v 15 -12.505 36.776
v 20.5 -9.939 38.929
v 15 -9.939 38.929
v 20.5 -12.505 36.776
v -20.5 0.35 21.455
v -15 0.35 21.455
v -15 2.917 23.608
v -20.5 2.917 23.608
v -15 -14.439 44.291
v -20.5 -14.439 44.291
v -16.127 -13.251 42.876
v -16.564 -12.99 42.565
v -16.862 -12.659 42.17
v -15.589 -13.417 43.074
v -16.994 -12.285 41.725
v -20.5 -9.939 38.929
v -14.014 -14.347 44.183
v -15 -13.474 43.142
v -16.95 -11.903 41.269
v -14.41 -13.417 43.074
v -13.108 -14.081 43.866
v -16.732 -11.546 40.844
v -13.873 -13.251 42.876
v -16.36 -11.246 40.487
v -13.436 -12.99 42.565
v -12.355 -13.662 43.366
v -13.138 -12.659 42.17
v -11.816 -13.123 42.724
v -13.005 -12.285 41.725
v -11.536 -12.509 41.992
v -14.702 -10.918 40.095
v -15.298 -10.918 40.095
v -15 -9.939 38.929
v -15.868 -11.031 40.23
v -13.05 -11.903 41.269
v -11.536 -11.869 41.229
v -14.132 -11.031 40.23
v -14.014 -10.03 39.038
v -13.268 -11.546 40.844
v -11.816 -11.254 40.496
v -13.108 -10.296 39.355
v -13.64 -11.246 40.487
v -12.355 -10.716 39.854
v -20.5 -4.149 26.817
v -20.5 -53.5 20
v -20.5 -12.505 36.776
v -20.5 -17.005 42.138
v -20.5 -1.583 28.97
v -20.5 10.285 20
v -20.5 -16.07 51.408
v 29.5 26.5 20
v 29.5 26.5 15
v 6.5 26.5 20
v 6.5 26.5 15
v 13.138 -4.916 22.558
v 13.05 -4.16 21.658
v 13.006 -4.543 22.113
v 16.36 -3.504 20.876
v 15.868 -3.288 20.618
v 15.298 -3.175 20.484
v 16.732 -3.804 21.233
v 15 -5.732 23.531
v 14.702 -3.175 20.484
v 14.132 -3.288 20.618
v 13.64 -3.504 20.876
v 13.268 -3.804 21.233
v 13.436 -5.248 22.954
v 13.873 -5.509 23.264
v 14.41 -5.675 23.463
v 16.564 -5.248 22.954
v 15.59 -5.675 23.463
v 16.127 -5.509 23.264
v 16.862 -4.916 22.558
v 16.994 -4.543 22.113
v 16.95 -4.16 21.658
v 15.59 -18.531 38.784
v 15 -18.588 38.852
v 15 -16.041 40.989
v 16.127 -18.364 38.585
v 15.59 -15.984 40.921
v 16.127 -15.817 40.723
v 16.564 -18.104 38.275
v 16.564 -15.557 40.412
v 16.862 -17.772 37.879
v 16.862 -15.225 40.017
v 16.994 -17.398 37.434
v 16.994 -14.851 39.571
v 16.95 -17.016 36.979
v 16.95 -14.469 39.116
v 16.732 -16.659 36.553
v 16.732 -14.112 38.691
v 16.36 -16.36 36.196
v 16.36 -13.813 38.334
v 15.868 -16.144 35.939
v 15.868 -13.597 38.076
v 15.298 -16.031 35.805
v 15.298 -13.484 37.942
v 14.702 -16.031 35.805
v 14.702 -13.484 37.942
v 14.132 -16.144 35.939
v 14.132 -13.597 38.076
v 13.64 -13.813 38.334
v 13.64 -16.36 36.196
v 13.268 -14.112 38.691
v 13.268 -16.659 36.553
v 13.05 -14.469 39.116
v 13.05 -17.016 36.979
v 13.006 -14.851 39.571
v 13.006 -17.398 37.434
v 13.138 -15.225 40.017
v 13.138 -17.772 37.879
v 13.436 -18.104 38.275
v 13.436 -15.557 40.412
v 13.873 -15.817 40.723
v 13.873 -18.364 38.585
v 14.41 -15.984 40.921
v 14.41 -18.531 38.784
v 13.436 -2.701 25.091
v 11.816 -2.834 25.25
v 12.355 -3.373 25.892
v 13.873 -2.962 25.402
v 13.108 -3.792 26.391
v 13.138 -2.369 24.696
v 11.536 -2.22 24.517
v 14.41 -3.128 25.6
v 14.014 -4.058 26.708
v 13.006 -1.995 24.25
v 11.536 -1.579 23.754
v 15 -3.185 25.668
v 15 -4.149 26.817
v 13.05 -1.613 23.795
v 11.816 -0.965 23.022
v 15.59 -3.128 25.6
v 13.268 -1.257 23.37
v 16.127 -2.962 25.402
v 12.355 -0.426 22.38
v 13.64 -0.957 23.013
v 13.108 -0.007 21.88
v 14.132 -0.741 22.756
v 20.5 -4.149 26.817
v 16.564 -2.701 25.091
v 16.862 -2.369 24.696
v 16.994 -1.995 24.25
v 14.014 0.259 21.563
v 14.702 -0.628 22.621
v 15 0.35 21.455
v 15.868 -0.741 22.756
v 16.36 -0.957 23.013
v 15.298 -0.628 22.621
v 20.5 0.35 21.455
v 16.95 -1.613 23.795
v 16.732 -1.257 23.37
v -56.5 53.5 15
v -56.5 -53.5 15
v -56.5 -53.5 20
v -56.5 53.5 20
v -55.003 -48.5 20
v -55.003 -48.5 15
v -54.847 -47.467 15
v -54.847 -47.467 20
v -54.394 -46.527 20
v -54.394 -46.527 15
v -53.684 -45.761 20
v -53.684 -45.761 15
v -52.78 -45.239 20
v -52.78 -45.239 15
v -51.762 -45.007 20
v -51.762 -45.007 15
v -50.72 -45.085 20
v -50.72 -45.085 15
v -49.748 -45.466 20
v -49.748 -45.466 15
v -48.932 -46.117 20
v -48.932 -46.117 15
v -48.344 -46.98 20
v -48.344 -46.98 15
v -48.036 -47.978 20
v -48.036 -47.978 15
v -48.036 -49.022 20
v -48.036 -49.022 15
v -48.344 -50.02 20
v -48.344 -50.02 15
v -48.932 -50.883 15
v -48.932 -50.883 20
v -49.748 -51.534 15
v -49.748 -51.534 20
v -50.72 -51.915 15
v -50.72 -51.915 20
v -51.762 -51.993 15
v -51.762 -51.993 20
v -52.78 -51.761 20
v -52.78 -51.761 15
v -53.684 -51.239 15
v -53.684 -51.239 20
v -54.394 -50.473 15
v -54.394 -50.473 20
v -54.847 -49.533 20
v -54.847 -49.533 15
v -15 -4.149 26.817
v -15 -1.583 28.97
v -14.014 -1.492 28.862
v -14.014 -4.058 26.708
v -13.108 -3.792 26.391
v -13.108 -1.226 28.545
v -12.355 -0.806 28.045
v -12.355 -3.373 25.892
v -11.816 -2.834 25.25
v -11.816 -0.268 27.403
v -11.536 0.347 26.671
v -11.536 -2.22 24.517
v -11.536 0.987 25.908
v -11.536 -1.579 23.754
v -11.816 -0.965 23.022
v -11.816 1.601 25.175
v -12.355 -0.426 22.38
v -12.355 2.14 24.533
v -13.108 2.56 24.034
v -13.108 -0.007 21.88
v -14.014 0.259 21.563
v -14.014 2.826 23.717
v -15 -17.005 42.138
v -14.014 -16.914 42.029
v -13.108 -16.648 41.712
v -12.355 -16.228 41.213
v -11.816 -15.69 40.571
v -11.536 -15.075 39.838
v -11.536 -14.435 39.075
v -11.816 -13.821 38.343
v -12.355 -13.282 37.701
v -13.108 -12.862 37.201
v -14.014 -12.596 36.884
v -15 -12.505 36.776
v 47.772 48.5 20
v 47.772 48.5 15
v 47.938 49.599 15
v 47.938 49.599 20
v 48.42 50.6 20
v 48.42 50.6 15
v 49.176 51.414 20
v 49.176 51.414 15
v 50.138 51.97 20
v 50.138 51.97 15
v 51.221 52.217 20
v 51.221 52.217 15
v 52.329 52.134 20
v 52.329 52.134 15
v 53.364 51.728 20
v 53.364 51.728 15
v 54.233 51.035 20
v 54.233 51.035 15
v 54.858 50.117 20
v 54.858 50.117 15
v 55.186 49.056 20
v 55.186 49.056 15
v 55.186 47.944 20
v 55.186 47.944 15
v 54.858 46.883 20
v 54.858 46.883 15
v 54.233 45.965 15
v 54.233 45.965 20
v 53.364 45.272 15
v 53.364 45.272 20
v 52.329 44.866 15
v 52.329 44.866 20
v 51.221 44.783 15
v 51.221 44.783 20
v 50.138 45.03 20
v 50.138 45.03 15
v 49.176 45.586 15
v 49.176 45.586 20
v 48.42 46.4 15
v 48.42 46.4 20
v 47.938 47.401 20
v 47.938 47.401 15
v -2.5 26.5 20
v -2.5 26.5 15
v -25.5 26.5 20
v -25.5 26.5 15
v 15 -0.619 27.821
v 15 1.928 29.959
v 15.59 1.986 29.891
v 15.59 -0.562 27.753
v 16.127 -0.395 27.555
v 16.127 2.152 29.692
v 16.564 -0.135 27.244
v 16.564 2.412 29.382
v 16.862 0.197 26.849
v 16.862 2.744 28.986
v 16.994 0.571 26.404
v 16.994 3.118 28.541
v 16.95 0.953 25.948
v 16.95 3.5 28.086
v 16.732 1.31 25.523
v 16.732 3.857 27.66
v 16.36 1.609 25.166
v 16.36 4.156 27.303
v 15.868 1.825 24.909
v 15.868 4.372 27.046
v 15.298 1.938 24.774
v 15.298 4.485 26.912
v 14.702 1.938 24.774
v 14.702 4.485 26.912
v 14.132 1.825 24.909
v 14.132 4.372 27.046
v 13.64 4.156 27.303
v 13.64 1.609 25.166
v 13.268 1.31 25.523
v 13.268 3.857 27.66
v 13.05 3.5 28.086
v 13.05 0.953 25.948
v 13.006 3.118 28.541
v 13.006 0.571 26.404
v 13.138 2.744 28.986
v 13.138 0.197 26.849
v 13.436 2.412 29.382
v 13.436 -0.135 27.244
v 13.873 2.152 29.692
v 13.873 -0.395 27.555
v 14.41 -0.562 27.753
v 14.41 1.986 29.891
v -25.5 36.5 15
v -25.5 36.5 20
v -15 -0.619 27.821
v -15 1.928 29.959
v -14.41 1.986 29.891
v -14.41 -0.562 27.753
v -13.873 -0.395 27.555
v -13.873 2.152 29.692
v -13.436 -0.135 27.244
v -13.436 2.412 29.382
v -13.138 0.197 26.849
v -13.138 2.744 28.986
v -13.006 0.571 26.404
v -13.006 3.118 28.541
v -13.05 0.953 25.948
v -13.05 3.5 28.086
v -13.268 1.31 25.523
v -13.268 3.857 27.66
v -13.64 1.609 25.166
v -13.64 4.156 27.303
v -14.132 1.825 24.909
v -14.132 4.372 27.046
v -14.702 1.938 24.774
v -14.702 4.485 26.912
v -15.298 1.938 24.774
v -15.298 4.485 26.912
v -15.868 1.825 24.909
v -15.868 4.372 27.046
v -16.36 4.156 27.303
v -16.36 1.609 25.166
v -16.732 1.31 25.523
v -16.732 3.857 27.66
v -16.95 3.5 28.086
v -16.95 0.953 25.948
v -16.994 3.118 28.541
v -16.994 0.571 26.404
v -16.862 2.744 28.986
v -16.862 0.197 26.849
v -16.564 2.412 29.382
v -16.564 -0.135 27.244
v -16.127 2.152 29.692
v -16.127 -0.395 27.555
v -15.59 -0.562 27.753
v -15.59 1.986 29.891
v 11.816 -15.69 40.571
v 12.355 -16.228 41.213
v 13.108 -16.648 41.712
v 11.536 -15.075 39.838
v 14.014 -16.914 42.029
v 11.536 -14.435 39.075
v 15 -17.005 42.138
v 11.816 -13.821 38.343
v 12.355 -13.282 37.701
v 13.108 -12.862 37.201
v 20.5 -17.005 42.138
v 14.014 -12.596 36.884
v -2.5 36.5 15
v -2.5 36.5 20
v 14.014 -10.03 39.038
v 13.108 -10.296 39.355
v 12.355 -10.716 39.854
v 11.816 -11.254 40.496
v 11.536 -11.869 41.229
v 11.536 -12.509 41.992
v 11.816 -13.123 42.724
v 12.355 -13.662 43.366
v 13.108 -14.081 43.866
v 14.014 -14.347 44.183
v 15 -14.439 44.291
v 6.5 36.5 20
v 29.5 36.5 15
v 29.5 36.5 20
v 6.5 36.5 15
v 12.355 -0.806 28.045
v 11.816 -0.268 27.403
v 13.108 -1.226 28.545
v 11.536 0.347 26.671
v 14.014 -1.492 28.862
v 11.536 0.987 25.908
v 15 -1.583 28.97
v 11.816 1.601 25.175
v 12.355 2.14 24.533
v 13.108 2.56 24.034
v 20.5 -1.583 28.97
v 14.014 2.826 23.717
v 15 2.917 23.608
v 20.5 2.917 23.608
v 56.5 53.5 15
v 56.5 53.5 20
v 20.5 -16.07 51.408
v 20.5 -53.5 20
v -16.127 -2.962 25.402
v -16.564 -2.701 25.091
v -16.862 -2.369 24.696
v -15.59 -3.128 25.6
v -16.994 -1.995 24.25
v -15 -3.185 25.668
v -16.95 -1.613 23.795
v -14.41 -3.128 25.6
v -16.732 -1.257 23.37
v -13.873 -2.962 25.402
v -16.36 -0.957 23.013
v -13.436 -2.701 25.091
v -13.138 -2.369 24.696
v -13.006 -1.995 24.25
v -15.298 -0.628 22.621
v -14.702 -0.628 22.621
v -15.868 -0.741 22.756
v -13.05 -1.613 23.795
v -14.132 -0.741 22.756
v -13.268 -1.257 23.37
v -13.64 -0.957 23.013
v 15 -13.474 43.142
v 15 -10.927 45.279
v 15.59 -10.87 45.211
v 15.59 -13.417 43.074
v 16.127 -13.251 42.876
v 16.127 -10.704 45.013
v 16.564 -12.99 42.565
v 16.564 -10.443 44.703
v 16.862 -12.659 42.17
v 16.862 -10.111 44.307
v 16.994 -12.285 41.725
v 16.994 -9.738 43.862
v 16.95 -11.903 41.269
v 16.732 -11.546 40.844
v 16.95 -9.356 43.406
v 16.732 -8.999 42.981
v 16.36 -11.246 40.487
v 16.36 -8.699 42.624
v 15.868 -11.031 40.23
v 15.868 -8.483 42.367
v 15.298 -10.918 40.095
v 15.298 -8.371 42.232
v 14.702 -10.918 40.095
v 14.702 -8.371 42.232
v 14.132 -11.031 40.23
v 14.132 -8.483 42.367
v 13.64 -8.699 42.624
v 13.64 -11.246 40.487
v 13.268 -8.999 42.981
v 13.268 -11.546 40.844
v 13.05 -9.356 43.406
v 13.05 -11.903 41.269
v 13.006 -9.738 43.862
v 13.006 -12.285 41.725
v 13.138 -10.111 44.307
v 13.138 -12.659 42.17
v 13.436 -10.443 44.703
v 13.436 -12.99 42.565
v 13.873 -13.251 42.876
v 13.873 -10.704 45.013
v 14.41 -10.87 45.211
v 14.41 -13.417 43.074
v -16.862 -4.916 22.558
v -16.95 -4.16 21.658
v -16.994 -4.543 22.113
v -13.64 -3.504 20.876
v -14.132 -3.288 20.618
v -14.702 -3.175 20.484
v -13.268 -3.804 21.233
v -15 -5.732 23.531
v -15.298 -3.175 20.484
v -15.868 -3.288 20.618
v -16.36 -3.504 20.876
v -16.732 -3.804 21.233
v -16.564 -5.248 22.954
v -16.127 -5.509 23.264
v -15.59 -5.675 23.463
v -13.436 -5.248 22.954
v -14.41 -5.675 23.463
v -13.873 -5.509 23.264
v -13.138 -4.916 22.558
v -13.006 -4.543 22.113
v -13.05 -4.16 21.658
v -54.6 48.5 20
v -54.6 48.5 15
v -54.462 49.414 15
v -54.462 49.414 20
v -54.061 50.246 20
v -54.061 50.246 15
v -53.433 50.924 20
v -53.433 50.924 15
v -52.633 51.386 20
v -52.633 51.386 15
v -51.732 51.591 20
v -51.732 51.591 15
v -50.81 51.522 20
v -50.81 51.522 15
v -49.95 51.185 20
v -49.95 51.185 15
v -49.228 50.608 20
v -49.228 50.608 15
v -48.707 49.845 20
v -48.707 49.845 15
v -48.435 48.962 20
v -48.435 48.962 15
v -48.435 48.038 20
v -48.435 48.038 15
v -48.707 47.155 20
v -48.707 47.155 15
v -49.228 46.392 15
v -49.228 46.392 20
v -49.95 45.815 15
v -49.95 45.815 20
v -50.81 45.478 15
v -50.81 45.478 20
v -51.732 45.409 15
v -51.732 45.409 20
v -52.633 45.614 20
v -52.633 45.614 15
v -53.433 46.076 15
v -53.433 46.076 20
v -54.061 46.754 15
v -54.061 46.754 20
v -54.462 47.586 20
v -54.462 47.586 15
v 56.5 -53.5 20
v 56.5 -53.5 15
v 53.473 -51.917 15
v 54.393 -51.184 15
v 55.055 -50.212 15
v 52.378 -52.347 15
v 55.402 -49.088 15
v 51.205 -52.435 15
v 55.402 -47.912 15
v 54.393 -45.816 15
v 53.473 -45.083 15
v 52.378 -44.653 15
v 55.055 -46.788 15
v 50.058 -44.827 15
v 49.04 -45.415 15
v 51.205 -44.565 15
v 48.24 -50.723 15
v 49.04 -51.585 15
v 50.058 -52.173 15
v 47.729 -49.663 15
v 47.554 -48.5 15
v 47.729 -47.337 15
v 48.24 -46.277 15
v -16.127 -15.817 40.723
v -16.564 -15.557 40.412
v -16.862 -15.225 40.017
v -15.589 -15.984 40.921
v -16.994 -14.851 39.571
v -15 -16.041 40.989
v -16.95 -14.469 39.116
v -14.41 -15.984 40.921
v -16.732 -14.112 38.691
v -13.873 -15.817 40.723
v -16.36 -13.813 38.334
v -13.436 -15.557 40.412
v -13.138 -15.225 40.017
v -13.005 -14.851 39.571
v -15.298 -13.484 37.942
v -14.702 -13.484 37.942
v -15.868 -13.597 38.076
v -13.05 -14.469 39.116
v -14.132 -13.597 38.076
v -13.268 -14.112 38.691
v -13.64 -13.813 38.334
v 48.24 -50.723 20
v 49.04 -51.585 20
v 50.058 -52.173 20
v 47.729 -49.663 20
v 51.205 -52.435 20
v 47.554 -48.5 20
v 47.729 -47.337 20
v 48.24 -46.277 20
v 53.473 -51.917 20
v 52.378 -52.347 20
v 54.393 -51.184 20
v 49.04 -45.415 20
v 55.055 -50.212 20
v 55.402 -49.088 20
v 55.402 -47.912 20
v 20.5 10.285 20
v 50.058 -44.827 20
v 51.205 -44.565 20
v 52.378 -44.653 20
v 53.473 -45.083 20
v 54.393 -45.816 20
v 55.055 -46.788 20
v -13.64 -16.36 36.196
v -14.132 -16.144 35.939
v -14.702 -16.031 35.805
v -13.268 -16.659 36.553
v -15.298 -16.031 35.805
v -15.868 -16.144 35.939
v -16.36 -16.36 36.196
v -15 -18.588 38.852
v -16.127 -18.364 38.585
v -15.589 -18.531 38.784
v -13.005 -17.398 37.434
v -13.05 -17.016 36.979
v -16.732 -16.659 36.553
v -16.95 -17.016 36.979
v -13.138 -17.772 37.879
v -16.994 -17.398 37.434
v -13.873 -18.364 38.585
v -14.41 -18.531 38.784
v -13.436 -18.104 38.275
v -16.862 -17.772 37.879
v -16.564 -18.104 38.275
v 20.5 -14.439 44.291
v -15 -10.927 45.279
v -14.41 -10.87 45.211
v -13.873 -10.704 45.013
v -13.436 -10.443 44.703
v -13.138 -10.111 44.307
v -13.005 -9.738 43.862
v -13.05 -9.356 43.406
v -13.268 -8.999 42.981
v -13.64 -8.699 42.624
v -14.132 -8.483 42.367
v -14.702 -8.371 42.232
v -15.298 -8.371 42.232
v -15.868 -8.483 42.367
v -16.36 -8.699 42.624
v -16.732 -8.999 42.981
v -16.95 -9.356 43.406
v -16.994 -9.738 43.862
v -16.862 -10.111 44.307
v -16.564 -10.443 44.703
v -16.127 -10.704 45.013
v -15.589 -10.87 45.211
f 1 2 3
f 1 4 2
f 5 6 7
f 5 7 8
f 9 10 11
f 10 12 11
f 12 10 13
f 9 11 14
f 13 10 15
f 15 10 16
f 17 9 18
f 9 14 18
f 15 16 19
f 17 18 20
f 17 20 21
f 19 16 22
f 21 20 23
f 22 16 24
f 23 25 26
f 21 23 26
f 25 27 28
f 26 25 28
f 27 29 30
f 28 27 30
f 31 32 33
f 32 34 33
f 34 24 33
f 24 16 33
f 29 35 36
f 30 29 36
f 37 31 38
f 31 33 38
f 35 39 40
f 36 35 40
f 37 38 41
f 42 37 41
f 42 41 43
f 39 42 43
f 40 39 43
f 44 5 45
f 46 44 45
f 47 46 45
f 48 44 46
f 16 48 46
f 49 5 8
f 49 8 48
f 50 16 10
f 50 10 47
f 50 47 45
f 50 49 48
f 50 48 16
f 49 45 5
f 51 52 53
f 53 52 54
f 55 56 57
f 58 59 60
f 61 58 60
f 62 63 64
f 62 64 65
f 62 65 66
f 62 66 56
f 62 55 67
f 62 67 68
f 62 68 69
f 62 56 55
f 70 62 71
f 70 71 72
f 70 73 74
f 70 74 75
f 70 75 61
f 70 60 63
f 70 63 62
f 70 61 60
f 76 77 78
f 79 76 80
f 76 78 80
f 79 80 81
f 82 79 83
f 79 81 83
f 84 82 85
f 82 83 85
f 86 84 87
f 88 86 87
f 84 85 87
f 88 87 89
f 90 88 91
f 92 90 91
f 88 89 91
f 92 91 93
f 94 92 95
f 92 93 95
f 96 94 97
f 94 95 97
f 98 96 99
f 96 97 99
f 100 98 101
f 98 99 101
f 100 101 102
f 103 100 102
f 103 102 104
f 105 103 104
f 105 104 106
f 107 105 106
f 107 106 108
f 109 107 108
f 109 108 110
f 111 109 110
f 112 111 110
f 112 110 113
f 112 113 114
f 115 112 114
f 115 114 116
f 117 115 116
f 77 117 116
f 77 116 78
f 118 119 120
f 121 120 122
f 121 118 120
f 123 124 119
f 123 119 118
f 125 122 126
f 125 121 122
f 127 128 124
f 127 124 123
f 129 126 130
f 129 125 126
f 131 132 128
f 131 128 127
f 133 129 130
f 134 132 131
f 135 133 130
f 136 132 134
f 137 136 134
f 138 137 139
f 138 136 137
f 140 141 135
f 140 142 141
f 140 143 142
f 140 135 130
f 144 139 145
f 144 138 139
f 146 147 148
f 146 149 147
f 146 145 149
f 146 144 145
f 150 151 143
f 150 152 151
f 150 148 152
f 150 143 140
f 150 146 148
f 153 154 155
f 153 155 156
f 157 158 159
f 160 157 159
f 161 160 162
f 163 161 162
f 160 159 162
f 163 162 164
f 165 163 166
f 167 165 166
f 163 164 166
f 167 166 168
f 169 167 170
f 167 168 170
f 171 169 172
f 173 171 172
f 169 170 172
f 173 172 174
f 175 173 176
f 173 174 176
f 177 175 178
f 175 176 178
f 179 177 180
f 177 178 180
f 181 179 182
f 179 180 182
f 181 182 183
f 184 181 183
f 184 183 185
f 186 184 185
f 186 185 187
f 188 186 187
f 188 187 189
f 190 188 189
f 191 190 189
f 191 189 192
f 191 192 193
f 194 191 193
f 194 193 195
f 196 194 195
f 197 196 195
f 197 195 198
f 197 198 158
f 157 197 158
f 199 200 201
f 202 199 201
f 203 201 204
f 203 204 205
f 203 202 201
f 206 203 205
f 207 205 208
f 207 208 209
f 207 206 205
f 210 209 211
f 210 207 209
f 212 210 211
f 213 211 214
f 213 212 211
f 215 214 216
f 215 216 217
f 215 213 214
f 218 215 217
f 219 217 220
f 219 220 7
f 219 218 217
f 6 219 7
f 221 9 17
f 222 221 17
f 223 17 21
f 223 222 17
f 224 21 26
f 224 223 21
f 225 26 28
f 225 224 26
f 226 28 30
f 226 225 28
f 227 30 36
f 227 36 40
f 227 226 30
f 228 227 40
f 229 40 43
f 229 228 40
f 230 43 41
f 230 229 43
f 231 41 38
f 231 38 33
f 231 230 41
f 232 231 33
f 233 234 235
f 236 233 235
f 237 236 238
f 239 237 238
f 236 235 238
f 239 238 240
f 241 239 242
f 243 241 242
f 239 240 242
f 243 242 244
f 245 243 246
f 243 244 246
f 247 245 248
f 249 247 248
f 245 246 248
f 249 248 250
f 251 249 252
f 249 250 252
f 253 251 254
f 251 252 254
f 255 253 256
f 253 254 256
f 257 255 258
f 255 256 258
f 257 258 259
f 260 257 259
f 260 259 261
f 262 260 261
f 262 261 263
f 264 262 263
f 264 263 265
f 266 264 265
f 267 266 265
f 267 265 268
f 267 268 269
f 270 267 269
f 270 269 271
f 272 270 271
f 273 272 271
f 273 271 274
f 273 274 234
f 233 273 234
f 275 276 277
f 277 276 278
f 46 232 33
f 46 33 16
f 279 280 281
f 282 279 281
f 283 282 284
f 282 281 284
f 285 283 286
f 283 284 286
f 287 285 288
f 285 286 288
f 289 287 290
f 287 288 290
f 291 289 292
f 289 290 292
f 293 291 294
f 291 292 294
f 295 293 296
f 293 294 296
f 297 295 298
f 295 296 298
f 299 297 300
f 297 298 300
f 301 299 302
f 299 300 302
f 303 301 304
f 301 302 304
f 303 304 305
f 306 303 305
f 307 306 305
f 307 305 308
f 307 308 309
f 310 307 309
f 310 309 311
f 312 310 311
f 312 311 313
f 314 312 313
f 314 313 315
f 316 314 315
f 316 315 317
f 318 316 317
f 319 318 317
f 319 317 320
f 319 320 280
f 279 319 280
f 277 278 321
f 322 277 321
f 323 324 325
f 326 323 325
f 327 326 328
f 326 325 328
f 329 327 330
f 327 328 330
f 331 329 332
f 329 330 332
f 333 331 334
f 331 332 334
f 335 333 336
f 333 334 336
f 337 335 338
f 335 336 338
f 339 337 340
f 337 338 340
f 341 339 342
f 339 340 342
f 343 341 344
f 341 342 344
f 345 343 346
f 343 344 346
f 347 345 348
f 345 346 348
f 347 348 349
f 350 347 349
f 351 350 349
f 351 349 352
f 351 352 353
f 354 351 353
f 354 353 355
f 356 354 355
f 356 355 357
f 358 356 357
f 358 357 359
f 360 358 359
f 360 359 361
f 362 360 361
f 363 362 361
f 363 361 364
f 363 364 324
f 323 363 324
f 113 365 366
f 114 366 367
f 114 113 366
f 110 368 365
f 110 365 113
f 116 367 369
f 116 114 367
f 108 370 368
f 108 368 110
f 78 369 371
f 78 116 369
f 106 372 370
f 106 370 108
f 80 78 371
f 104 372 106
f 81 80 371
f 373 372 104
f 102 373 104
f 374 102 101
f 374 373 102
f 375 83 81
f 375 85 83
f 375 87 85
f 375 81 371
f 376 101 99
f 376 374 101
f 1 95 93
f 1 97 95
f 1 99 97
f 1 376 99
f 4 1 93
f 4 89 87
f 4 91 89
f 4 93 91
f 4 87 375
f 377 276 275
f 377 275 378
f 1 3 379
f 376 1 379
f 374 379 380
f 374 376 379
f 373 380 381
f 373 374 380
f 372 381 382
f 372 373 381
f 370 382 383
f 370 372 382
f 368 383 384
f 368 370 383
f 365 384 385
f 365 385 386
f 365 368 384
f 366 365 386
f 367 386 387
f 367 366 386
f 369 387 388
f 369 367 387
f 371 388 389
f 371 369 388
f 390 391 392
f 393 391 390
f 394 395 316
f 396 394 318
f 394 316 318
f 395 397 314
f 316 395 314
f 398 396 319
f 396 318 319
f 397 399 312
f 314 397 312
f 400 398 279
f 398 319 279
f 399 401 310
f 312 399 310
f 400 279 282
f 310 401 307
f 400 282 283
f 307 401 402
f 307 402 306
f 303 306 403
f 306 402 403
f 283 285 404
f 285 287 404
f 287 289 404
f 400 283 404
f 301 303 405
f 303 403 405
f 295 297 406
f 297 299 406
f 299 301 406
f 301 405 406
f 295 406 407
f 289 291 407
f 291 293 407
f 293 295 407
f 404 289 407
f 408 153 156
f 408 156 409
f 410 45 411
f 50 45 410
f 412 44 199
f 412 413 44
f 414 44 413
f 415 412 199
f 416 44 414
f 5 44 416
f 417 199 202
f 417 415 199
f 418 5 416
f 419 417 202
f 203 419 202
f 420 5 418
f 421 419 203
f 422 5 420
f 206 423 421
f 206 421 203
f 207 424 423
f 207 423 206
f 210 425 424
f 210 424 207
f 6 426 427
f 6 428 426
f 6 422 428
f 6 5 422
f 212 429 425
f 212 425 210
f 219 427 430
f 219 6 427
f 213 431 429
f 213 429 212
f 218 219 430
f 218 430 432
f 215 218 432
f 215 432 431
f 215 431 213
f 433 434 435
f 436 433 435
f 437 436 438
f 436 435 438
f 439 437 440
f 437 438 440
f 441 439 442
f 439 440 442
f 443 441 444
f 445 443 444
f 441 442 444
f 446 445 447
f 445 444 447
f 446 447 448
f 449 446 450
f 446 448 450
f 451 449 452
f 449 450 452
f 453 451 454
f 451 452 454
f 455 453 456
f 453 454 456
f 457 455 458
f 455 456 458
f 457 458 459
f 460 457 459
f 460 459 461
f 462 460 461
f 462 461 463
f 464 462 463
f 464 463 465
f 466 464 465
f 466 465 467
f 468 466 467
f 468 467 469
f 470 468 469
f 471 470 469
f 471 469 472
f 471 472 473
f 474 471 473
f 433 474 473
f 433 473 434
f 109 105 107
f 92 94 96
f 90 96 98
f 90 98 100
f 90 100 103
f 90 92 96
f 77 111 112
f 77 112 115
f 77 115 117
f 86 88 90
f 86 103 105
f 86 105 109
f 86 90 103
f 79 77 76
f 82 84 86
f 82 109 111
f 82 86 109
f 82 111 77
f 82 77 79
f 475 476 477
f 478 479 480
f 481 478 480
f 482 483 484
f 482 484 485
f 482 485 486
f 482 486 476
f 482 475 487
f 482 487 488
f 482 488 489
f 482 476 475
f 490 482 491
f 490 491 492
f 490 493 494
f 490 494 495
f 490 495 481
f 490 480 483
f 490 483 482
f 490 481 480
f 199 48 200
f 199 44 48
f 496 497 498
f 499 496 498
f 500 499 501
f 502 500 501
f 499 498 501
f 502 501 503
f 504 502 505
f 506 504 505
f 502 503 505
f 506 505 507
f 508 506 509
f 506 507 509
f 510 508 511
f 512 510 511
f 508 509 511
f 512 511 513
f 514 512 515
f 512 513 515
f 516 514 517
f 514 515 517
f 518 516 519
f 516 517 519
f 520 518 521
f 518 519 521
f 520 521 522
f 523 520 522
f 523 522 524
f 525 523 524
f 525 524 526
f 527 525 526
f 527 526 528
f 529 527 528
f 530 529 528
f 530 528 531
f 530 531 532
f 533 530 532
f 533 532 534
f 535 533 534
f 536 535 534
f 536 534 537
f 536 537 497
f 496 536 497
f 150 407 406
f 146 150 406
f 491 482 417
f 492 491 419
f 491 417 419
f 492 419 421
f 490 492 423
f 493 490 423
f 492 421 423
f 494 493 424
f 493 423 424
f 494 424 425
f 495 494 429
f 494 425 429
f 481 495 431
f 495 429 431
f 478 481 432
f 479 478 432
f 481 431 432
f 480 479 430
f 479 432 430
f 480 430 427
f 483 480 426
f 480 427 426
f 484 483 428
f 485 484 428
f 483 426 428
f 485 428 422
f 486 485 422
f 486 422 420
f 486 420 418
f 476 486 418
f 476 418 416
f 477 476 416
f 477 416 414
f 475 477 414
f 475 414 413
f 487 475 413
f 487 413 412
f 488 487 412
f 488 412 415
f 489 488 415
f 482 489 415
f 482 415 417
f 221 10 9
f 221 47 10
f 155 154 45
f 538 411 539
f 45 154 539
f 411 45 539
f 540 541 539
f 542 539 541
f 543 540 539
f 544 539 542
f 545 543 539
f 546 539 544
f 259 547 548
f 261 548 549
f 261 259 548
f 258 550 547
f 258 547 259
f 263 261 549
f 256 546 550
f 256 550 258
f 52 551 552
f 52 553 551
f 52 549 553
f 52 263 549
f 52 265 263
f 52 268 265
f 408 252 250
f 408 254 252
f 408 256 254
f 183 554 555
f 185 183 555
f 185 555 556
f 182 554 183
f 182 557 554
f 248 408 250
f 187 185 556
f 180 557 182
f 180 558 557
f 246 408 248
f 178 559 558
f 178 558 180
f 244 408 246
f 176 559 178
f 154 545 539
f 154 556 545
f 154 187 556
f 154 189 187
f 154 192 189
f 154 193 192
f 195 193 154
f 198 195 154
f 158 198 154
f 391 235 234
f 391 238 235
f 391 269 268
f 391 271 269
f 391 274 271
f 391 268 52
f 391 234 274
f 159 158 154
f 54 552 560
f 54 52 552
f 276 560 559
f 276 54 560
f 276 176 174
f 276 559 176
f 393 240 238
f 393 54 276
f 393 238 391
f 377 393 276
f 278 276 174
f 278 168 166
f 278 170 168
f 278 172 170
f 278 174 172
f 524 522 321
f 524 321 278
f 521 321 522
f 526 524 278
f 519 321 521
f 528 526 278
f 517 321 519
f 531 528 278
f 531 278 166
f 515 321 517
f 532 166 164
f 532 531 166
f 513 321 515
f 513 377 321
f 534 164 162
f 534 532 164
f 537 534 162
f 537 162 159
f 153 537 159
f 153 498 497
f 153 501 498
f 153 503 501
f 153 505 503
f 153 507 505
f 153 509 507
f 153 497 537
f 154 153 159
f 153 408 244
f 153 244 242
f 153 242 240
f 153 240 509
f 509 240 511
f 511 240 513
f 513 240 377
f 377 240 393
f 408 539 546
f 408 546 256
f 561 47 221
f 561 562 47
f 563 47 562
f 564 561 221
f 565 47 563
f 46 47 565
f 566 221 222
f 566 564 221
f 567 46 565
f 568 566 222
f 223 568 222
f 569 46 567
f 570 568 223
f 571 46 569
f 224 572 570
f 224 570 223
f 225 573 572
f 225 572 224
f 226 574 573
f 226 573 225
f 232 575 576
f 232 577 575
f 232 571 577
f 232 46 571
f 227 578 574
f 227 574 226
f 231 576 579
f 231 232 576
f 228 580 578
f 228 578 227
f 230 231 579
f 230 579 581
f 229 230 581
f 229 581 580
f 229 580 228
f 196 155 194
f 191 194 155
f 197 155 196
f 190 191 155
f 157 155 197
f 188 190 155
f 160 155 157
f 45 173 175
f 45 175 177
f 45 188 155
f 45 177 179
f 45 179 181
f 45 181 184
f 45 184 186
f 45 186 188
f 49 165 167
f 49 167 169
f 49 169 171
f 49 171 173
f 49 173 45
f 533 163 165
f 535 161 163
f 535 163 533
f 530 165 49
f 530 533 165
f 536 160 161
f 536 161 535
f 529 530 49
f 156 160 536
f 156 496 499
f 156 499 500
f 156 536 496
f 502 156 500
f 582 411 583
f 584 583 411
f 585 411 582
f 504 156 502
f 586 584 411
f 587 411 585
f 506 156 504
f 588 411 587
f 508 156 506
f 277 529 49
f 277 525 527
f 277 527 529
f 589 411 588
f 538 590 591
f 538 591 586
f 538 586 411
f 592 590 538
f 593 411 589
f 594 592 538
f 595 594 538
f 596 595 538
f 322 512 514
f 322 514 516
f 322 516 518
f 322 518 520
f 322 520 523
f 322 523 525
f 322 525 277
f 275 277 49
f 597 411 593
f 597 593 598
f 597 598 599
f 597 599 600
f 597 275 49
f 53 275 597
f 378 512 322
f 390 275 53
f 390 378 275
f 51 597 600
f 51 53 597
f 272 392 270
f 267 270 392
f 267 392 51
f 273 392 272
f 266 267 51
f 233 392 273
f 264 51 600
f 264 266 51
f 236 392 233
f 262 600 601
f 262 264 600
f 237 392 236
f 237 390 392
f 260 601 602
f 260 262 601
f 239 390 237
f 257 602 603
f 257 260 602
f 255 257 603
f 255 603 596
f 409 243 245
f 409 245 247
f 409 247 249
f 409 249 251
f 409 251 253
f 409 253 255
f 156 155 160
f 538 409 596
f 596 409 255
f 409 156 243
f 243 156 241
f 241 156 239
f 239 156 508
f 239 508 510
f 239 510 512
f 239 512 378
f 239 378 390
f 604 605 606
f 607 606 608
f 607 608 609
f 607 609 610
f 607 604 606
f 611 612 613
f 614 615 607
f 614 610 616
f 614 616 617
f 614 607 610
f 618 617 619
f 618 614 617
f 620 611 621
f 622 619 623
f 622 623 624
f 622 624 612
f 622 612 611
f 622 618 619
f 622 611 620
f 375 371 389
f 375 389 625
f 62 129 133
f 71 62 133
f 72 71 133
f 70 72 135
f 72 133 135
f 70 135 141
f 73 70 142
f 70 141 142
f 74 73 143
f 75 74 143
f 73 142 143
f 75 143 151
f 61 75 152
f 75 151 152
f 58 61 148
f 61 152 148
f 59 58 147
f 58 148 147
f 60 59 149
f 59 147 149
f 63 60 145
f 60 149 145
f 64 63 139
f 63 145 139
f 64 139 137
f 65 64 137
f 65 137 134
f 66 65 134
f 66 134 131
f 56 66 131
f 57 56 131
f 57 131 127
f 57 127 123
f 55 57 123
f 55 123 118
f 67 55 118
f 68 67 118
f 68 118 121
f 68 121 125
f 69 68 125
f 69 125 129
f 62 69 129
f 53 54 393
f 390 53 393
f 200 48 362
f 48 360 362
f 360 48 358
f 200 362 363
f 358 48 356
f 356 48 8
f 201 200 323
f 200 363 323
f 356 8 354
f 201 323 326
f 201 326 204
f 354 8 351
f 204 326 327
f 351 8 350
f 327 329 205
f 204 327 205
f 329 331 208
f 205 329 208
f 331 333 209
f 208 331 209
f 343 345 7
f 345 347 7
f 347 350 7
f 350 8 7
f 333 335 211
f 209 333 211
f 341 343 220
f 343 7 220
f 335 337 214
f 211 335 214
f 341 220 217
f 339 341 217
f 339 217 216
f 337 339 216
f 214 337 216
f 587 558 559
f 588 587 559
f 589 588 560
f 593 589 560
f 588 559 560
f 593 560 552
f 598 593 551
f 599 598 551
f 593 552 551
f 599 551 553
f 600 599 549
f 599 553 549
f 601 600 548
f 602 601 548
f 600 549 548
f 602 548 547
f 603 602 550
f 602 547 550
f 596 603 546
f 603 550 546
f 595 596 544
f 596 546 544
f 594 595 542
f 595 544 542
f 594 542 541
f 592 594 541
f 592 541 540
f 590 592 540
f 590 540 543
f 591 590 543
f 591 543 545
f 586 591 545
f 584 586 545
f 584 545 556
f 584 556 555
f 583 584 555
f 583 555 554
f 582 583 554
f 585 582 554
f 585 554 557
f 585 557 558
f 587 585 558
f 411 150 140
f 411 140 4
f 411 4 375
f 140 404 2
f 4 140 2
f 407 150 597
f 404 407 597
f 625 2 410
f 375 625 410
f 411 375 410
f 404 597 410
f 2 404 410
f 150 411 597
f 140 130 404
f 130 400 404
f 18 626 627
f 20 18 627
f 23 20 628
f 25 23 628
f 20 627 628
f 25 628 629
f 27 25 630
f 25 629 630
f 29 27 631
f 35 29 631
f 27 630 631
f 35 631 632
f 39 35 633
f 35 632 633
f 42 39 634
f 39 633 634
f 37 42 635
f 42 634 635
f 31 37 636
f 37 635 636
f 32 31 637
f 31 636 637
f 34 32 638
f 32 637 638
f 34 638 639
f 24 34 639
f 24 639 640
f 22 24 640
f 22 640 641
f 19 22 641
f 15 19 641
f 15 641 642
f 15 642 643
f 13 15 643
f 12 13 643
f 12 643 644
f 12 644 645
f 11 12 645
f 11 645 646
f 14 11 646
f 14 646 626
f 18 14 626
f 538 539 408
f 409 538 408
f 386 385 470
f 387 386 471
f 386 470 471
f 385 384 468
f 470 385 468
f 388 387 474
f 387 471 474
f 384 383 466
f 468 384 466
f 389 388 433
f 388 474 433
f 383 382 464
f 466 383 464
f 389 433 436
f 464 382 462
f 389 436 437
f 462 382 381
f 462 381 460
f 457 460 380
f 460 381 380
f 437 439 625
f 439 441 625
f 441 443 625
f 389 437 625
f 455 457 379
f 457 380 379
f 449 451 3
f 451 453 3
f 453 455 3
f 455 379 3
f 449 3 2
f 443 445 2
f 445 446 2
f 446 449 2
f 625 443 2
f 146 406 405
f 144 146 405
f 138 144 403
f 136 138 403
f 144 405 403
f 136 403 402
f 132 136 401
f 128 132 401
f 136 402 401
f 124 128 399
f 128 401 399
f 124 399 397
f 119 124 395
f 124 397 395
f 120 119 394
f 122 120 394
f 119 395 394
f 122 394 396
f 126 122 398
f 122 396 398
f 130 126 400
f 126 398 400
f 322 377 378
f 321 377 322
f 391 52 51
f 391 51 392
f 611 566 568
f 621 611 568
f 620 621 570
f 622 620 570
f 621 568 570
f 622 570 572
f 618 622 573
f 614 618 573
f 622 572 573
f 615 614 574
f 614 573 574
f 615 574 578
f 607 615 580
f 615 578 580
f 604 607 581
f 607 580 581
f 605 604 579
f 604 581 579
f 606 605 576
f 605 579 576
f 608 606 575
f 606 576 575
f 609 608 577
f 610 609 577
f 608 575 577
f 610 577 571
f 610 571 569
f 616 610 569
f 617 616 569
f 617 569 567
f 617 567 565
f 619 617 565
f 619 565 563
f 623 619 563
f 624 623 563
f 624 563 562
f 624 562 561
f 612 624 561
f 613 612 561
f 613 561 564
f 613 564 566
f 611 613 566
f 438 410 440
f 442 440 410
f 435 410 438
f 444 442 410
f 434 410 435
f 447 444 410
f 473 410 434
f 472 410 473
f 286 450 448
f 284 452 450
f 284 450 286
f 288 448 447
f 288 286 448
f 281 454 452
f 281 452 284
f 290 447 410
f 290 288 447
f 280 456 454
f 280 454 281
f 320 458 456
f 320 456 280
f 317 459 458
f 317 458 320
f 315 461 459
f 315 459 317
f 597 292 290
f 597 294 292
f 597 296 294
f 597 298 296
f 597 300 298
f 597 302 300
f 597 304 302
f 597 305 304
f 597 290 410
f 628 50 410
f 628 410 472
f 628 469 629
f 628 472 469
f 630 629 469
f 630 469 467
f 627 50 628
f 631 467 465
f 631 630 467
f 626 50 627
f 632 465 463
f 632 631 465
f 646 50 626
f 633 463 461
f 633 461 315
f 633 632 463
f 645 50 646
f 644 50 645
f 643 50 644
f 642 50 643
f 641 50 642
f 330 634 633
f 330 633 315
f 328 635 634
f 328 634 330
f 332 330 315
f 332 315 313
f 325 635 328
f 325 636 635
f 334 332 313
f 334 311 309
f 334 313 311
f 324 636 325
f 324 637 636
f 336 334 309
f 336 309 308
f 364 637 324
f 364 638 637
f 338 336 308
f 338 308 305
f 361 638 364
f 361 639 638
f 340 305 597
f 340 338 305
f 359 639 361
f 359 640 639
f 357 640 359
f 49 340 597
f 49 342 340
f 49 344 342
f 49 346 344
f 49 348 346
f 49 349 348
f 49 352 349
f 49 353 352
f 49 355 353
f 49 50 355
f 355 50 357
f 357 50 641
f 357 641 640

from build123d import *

# Parameters (mm, degrees)
SKETCH1_W           = 113
SKETCH1_H           = 107
BOSS_EXTRUDE1_DEPTH = 20
SKETCH2_W           = 93
SKETCH2_H           = 87
CUT_EXTRUDE1_DEPTH  = 15
BOSS_EXTRUDE4_DEPTH = 20.5
SKETCH7_W           = 23
SKETCH7_H           = 10
CUT_EXTRUDE2_DEPTH  = 41
SKETCH10_R          = 3.727648652
SKETCH10_R_2        = 3.099940234
SKETCH10_R_3        = 3.503081025
SKETCH10_R_4        = 3.946186921
CUT_EXTRUDE3_DEPTH  = 94.259123843
SKETCH12_R          = 2
CUT_EXTRUDE5_DEPTH  = 10
CUT_EXTRUDE6_DEPTH  = 1.675
SKETCH15_W          = 118.362800564
SKETCH15_H          = 111.14113597
CUT_EXTRUDE7_DEPTH  = 86.907098164


with BuildPart() as part:
    # Sketch1 → Boss-Extrude1 (new body)
    with BuildSketch(Plane.XY):
        Rectangle(SKETCH1_W, SKETCH1_H)
    extrude(amount=BOSS_EXTRUDE1_DEPTH)

    # Sketch2 → Cut-Extrude1 (cut)
    with BuildSketch(Plane(origin=(0, 0, 0), x_dir=(-1, 0, 0), z_dir=(0, 0, -1))):
        Rectangle(SKETCH2_W, SKETCH2_H)
    extrude(amount=-CUT_EXTRUDE1_DEPTH, mode=Mode.SUBTRACT)

    # Sketch9 → Boss-Extrude4 (add, symmetric)
    with BuildSketch(Plane.ZY):
        Polygon((20, -53.5), (51.407822168, -16.069615096), (20, 10.284676901), align=None)
    extrude(amount=BOSS_EXTRUDE4_DEPTH, both=True)

    # Sketch7 → Cut-Extrude2 (cut)
    with BuildSketch(Plane(origin=(0, 0, 15), x_dir=(-1, 0, 0), z_dir=(0, 0, -1))):
        with Locations((-18, 31.5)):
            Rectangle(SKETCH7_W, SKETCH7_H)
        with Locations((14, 31.5)):
            Rectangle(SKETCH7_W, SKETCH7_H)
    extrude(amount=-CUT_EXTRUDE2_DEPTH, mode=Mode.SUBTRACT)

    # Sketch10 → Cut-Extrude3 (cut, through all)
    with BuildSketch(Plane(origin=(0, 0, 0), x_dir=(-1, 0, 0), z_dir=(0, 0, -1))):
        with Locations((-51.5, 48.5)):
            Circle(SKETCH10_R)
        with Locations((51.5, 48.5)):
            Circle(SKETCH10_R_2)
        with Locations((51.5, -48.5)):
            Circle(SKETCH10_R_3)
        with Locations((-51.5, -48.5)):
            Circle(SKETCH10_R_4)
    extrude(amount=-CUT_EXTRUDE3_DEPTH, mode=Mode.SUBTRACT)

    # Sketch12 → Cut-Extrude5 (cut)
    with BuildSketch(Plane(origin=(0, 15.883373682, 13.327732998), x_dir=(1, 0, 0), z_dir=(0, 0.7660444431189817, 0.6427876096865348))):
        with Locations(Location((-15, -19.710025981, 0), (0, 0, 270))):
            Circle(SKETCH12_R)
        with Locations(Location((15, -19.710025981, 0), (0, 0, 270))):
            Circle(SKETCH12_R)
        with Locations(Location((-14.999896364, -39.710025981, 0), (0, 0, 270))):
            Circle(SKETCH12_R)
        with Locations(Location((15, -39.710025981, 0), (0, 0, 270))):
            Circle(SKETCH12_R)
    extrude(amount=-CUT_EXTRUDE5_DEPTH, mode=Mode.SUBTRACT)

    # Sketch14 → Cut-Extrude6 (cut, symmetric)
    with BuildSketch(Plane(origin=(0, 12.053151466, 10.11379495), x_dir=(1, 0, 0), z_dir=(0, 0.7660444431189817, 0.6427876096865348))):
        with BuildLine():
            Line((-20.5, -16.210025981), (-20.5, -23.210025981))
            Line((-20.5, -23.210025981), (-15, -23.210025981))
            ThreePointArc((-15, -23.210025981), (-11.5, -19.710025981), (-15, -16.210025981))
            Line((-15, -16.210025981), (-20.5, -16.210025981))
        make_face()
        with BuildLine():
            Line((-20.5, -36.210025981), (-20.5, -43.210025981))
            Line((-20.5, -43.210025981), (-14.999896364, -43.210025981))
            ThreePointArc((-14.999896364, -43.210025981), (-11.499896364, -39.710025981), (-14.999896364, -36.210025981))
            Line((-14.999896364, -36.210025981), (-20.5, -36.210025981))
        make_face()
        with BuildLine():
            Line((20.5, -43.210025981), (20.5, -36.210025981))
            Line((20.5, -36.210025981), (15, -36.210025981))
            ThreePointArc((15, -36.210025981), (11.5, -39.710025981), (15, -43.210025981))
            Line((15, -43.210025981), (20.5, -43.210025981))
        make_face()
        with BuildLine():
            Line((20.5, -23.210025981), (20.5, -16.210025981))
            Line((20.5, -16.210025981), (15, -16.210025981))
            ThreePointArc((15, -16.210025981), (11.5, -19.710025981), (15, -23.210025981))
            Line((15, -23.210025981), (20.5, -23.210025981))
        make_face()
    extrude(amount=CUT_EXTRUDE6_DEPTH, both=True, mode=Mode.SUBTRACT)

    # Sketch15 → Cut-Extrude7 (cut, through all)
    with BuildSketch(Plane(origin=(0, 0, 15), x_dir=(-1, 0, 0), z_dir=(0, 0, -1))):
        Rectangle(SKETCH15_W, SKETCH15_H)
    extrude(amount=CUT_EXTRUDE7_DEPTH, mode=Mode.SUBTRACT)


solid = part.part
